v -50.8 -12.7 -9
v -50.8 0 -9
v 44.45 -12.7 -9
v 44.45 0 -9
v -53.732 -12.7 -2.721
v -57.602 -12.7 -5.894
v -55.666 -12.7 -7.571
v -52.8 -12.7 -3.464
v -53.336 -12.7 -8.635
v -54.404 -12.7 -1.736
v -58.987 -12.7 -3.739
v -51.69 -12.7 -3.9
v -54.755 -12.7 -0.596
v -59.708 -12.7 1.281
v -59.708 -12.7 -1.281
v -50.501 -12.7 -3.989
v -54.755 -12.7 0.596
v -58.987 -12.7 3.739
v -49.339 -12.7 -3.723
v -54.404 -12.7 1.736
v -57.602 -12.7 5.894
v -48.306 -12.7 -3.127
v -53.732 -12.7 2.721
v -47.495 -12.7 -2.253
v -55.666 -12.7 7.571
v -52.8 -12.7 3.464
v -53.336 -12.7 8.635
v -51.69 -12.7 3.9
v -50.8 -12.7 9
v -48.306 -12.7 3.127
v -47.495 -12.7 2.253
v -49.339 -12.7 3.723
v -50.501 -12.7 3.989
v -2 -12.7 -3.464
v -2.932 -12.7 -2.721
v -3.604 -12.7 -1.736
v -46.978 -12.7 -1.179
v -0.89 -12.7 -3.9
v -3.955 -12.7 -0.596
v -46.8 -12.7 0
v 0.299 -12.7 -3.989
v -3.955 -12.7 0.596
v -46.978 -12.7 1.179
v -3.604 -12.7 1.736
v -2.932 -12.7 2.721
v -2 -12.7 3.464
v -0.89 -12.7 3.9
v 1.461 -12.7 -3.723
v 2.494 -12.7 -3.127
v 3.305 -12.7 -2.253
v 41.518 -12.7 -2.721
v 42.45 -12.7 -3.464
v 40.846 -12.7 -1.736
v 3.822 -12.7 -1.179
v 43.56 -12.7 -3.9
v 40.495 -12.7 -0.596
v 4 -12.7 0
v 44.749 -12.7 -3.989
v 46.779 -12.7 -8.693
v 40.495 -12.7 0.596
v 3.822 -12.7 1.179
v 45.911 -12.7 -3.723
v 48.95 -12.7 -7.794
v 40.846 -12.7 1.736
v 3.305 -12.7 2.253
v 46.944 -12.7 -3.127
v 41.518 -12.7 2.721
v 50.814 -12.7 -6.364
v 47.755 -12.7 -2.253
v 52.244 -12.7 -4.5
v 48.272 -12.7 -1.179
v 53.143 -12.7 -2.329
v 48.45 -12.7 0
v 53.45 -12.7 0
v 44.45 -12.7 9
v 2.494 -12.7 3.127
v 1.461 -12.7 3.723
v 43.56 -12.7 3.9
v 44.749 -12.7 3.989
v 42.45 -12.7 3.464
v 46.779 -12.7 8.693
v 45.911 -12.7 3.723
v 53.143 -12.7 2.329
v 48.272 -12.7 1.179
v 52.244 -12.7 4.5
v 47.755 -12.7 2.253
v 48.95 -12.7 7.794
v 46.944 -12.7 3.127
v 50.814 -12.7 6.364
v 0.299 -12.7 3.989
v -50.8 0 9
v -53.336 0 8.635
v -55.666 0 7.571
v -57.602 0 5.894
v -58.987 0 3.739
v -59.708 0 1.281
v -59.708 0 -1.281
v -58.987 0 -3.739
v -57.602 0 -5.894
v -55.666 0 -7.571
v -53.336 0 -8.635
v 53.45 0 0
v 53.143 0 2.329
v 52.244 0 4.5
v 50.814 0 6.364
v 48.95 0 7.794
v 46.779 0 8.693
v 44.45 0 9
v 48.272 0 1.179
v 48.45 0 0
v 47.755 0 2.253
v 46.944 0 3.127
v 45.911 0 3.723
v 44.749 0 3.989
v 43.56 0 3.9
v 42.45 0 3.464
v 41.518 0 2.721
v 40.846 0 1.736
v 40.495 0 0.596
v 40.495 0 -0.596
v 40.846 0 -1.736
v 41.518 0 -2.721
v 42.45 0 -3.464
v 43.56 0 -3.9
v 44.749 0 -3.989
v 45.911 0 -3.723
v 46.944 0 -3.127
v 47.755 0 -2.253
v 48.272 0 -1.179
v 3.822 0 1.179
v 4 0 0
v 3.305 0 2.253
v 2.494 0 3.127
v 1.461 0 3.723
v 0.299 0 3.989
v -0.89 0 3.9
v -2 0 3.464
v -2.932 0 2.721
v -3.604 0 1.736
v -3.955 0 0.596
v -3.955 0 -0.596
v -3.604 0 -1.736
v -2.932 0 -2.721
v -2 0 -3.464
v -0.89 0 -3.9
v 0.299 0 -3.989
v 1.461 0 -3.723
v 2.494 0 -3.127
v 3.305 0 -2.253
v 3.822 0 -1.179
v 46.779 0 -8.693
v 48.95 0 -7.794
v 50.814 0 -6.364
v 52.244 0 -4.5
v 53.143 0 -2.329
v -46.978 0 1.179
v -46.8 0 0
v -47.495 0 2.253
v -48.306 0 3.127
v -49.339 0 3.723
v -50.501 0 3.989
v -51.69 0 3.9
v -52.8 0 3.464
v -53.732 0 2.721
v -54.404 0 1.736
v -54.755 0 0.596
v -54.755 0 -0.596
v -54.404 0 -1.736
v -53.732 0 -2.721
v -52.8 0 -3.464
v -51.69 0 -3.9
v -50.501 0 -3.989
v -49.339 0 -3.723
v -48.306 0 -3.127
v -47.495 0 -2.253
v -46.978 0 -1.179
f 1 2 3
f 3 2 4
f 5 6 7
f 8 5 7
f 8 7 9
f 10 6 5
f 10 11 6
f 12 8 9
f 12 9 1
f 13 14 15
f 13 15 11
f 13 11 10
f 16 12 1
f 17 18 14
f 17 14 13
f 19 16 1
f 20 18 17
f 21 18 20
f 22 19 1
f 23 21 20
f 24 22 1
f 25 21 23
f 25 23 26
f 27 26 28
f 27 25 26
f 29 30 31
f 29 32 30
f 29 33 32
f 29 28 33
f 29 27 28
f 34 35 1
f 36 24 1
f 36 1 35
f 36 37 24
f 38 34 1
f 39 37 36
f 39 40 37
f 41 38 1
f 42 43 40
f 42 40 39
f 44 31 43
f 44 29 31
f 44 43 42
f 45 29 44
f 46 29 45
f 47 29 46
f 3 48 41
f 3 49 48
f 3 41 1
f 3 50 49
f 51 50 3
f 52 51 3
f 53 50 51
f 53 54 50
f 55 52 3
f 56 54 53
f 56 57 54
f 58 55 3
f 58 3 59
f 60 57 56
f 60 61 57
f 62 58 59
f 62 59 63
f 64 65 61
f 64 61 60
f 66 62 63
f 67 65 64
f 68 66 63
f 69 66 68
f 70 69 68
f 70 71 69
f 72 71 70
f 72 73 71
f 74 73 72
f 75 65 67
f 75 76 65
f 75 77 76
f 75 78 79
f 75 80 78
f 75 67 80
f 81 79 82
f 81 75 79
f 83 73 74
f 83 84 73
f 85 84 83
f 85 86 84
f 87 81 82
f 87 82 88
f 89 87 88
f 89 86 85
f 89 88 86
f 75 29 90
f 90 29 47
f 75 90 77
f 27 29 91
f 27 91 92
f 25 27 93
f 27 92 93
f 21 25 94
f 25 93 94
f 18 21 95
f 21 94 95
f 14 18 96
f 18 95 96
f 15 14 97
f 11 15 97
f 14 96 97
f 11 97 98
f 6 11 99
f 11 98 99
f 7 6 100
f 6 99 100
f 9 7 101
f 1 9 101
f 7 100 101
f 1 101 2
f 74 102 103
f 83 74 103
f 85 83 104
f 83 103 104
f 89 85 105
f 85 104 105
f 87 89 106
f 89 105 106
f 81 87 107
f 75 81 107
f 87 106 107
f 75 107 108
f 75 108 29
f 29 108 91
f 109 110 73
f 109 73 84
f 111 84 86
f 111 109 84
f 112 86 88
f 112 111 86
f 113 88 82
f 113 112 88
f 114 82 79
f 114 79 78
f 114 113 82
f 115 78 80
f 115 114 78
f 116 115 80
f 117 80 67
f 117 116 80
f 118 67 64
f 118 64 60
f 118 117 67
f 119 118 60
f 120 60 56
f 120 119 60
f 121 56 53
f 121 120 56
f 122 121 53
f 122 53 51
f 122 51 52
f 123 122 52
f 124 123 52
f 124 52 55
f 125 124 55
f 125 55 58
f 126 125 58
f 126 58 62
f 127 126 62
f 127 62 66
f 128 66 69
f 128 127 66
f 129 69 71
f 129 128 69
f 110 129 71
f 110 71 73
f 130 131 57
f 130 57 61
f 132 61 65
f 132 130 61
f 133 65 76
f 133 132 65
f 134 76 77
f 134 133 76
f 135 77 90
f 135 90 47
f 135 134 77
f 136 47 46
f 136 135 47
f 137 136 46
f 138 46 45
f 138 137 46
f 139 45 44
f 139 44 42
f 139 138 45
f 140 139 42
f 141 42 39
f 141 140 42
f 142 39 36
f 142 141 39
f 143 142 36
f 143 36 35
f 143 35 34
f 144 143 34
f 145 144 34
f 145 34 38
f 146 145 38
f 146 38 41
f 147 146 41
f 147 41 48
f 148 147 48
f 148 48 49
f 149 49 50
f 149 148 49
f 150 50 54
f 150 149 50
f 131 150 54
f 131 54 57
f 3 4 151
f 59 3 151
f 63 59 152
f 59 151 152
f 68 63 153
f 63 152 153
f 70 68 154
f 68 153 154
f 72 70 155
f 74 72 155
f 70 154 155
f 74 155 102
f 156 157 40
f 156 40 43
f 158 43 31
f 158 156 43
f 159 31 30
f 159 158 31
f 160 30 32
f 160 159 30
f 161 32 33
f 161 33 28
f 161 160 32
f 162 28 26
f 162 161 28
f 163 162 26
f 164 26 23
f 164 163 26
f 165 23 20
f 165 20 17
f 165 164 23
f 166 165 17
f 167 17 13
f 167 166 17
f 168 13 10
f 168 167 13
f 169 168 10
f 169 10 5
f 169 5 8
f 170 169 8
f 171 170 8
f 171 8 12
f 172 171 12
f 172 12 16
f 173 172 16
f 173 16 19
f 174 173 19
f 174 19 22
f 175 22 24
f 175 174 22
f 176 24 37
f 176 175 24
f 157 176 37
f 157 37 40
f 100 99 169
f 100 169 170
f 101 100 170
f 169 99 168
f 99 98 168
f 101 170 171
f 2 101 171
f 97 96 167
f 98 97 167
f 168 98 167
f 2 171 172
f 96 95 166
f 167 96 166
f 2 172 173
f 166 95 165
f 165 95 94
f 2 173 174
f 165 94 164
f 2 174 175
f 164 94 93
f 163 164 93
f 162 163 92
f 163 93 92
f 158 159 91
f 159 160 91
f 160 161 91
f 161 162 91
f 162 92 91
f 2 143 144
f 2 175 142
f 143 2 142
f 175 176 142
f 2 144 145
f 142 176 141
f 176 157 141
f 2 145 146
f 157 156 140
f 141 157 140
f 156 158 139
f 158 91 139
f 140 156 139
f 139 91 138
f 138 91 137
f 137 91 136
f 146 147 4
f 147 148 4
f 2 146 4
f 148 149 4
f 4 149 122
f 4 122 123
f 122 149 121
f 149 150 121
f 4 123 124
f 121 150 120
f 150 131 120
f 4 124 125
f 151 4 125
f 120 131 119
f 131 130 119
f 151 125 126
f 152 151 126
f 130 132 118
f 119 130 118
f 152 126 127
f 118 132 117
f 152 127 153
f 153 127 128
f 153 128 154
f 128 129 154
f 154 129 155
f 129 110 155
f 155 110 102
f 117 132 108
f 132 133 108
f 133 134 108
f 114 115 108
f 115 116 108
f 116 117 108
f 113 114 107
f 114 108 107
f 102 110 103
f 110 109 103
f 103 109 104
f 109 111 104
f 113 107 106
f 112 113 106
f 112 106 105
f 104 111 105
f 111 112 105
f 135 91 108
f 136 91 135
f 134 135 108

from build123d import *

# Parameters (mm, degrees)
F0_R     = 4
F1_DEPTH = 12.7


# Not quite as in the source:
# - a feature names something its author has since deleted; it is built from what else it names


with BuildPart() as f1:
    # F0 (on Front) → F1 (new body)
    with BuildSketch(Plane.XZ):
        with BuildLine():
            ThreePointArc((-50.8, -9), (-44.4360389693, -6.3639610307), (-41.8, 0))
            ThreePointArc((-41.8, 0), (-44.4360389693, 6.3639610307), (-50.8, 9))
            ThreePointArc((-50.8, 9), (-59.8, 0), (-50.8, -9))
        make_face()
        with Locations((-50.8, 0)):
            Circle(F0_R, mode=Mode.SUBTRACT)
        with BuildLine():
            ThreePointArc((9, 0), (6.3639610238, 6.3639610375), (-1.93e-08, 9))
            ThreePointArc((-1.93e-08, 9), (-9, -9.7e-09), (0, -9))
            ThreePointArc((0, -9), (6.3639610307, -6.3639610307), (9, 0))
        make_face()
        Circle(F0_R, mode=Mode.SUBTRACT)
        with BuildLine():
            ThreePointArc((-50.8, 9), (-44.4360389693, 6.3639610307), (-41.8, 0))
            ThreePointArc((-41.8, 0), (-44.4360389693, -6.3639610307), (-50.8, -9))
            Line((-50.8, -9), (0, -9))
            ThreePointArc((0, -9), (-9, -9.7e-09), (-1.93e-08, 9))
            Line((-1.93e-08, 9), (-50.8, 9))
        make_face()
        with BuildLine():
            Line((44.45, 9), (-1.93e-08, 9))
            ThreePointArc((-1.93e-08, 9), (6.3639610238, 6.3639610375), (9, 0))
            ThreePointArc((9, 0), (6.3639610307, -6.3639610307), (0, -9))
            Line((0, -9), (44.45, -9))
            ThreePointArc((44.45, -9), (35.45, 0), (44.45, 9))
        make_face()
        with BuildLine():
            ThreePointArc((53.45, 0), (50.8139610307, 6.3639610307), (44.45, 9))
            ThreePointArc((44.45, 9), (35.45, 0), (44.45, -9))
            ThreePointArc((44.45, -9), (50.8139610307, -6.3639610307), (53.45, 0))
        make_face()
        with Locations((44.45, 0)):
            Circle(F0_R, mode=Mode.SUBTRACT)
    extrude(amount=F1_DEPTH)


solid = f1.part
